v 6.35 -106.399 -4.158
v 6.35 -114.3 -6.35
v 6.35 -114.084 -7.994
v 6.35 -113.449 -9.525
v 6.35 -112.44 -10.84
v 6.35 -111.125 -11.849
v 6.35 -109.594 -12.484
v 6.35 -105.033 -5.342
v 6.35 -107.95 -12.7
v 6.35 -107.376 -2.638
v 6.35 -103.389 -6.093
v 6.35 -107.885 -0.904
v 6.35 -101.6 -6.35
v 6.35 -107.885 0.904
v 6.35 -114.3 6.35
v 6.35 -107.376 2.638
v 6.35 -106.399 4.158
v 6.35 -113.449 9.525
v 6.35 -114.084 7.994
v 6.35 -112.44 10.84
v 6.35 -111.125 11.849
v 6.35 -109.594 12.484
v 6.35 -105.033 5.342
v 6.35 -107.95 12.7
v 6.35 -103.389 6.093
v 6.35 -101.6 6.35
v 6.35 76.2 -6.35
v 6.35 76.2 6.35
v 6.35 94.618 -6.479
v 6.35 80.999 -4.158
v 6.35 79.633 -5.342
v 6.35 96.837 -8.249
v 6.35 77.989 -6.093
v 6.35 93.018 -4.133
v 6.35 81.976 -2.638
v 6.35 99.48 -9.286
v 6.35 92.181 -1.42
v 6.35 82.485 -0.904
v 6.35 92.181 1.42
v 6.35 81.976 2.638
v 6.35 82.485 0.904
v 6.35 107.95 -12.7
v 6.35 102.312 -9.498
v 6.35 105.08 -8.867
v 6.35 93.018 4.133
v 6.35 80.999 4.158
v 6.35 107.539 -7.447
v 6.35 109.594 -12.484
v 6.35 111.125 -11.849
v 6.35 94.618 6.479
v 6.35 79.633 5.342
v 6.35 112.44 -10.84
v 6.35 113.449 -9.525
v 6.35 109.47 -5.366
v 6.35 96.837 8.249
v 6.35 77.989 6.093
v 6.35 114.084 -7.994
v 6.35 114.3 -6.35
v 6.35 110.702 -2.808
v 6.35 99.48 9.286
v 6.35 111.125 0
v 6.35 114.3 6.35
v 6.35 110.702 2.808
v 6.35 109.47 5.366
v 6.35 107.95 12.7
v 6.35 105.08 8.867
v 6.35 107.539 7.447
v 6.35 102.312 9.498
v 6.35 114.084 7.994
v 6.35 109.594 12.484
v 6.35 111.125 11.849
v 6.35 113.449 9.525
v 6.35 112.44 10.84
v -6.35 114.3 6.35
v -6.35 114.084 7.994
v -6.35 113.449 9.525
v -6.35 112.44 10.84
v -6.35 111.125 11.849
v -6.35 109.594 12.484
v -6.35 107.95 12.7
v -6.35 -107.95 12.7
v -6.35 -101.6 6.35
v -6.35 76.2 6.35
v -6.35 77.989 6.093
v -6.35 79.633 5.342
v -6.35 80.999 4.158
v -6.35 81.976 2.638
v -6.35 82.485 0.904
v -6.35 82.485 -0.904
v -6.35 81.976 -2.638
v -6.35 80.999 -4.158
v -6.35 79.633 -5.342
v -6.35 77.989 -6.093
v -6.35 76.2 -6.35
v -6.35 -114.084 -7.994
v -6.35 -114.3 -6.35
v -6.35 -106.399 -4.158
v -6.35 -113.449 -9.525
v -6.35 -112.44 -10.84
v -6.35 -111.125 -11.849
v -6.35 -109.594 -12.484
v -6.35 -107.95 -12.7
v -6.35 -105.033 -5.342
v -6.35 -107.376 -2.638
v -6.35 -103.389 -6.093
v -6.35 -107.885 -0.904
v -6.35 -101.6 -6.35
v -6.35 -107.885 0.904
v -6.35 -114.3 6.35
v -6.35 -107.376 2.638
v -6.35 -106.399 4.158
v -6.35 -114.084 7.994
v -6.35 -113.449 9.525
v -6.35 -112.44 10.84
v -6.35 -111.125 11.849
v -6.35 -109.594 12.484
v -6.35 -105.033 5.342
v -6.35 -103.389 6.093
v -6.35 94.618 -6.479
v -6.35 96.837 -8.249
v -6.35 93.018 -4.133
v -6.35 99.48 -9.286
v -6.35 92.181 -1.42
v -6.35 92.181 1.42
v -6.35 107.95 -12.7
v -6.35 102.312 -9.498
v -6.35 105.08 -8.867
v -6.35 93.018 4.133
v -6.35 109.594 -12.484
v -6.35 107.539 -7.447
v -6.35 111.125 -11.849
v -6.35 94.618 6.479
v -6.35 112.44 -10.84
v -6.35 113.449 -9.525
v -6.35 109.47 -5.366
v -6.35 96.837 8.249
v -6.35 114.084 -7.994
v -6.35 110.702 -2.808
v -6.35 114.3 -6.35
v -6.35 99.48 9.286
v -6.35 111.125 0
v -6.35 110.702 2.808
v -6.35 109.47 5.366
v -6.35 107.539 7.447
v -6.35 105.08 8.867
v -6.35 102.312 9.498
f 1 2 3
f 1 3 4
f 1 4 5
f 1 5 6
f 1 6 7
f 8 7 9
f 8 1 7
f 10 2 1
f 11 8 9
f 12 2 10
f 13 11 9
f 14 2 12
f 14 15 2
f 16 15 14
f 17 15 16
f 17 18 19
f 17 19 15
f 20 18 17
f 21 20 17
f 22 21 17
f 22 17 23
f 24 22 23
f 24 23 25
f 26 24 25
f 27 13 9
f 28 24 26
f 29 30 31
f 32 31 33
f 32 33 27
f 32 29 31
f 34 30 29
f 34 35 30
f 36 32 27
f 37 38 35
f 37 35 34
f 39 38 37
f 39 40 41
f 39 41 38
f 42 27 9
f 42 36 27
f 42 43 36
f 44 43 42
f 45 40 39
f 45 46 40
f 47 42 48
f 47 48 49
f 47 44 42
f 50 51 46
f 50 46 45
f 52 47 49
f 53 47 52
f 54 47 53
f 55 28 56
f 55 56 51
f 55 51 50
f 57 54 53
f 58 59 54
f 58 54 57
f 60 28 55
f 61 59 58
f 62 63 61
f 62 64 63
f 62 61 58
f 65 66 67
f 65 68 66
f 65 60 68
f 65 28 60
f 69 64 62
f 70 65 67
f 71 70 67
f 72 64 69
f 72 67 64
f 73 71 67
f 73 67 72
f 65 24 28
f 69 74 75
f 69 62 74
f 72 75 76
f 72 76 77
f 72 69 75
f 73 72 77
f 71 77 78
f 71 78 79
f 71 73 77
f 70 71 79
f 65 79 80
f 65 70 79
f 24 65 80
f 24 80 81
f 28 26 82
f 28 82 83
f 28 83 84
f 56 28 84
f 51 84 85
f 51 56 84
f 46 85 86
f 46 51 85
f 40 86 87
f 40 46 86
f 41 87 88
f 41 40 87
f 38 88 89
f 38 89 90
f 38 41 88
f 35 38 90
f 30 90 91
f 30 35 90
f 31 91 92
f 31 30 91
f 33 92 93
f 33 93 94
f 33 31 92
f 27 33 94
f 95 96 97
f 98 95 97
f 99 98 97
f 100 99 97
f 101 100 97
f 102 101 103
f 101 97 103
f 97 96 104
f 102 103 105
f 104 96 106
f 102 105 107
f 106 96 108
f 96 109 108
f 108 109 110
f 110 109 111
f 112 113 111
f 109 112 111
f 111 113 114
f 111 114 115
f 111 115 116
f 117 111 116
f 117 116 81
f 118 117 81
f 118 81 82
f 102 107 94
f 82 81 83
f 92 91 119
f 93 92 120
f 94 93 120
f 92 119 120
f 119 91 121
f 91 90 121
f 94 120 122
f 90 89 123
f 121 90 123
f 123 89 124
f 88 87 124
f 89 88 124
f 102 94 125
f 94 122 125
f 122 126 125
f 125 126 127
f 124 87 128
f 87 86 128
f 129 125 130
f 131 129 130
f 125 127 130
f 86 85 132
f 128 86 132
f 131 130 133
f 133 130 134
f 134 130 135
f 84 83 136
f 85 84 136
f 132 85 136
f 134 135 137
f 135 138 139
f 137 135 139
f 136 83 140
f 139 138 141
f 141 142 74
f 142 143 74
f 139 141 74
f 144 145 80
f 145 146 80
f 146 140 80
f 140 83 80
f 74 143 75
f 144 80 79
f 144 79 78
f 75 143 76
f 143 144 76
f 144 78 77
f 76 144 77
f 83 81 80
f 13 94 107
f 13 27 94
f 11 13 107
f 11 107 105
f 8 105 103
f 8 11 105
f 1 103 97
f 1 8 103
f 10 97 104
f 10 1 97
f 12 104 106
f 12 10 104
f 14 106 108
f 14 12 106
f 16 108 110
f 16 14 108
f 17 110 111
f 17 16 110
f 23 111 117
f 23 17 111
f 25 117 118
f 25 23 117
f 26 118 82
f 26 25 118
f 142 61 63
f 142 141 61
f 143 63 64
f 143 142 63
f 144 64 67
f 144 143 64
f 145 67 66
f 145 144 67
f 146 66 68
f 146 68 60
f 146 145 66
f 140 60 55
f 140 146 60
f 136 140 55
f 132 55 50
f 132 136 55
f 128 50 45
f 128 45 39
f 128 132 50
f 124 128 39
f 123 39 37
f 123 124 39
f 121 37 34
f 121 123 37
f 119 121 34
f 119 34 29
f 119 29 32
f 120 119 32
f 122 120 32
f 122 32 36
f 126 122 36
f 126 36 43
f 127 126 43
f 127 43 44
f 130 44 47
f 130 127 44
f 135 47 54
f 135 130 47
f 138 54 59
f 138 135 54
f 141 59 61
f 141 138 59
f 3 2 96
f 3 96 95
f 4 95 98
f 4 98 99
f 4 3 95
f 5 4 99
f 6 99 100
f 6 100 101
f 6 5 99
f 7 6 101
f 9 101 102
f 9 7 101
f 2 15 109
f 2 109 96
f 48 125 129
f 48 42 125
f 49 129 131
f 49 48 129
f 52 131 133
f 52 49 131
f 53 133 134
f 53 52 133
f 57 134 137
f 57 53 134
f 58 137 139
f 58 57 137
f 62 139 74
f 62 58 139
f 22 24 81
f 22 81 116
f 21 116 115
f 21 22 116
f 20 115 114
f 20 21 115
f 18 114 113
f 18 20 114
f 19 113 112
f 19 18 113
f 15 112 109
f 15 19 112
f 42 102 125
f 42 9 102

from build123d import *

# Parameters (mm, degrees)
F0_R     = 9.525
F1_DEPTH = 6.35


with BuildPart() as f1:
    # F0 (on Right) → F1 (new body, symmetric)
    with BuildSketch(Plane.YZ):
        with BuildLine():
            ThreePointArc((114.3, 6.35), (112.440128, 10.840128), (107.95, 12.7))
            Line((107.95, 12.7), (-107.95, 12.7))
            ThreePointArc((-107.95, 12.7), (-112.440128, 10.840128), (-114.3, 6.35))
            Line((-114.3, 6.35), (-114.3, -6.35))
            ThreePointArc((-114.3, -6.35), (-112.440128, -10.840128), (-107.95, -12.7))
            Line((-107.95, -12.7), (107.95, -12.7))
            ThreePointArc((107.95, -12.7), (112.440128, -10.840128), (114.3, -6.35))
            Line((114.3, -6.35), (114.3, 6.35))
        make_face()
        with BuildLine():
            ThreePointArc((-101.6, -6.35), (-107.95, 0), (-101.6, 6.35))
            Line((-101.6, 6.35), (76.2, 6.35))
            ThreePointArc((76.2, 6.35), (82.55, 0), (76.2, -6.35))
            Line((76.2, -6.35), (-101.6, -6.35))
        make_face(mode=Mode.SUBTRACT)
        with Locations((101.6, 0)):
            Circle(F0_R, mode=Mode.SUBTRACT)
    extrude(amount=F1_DEPTH, both=True)


solid = f1.part
